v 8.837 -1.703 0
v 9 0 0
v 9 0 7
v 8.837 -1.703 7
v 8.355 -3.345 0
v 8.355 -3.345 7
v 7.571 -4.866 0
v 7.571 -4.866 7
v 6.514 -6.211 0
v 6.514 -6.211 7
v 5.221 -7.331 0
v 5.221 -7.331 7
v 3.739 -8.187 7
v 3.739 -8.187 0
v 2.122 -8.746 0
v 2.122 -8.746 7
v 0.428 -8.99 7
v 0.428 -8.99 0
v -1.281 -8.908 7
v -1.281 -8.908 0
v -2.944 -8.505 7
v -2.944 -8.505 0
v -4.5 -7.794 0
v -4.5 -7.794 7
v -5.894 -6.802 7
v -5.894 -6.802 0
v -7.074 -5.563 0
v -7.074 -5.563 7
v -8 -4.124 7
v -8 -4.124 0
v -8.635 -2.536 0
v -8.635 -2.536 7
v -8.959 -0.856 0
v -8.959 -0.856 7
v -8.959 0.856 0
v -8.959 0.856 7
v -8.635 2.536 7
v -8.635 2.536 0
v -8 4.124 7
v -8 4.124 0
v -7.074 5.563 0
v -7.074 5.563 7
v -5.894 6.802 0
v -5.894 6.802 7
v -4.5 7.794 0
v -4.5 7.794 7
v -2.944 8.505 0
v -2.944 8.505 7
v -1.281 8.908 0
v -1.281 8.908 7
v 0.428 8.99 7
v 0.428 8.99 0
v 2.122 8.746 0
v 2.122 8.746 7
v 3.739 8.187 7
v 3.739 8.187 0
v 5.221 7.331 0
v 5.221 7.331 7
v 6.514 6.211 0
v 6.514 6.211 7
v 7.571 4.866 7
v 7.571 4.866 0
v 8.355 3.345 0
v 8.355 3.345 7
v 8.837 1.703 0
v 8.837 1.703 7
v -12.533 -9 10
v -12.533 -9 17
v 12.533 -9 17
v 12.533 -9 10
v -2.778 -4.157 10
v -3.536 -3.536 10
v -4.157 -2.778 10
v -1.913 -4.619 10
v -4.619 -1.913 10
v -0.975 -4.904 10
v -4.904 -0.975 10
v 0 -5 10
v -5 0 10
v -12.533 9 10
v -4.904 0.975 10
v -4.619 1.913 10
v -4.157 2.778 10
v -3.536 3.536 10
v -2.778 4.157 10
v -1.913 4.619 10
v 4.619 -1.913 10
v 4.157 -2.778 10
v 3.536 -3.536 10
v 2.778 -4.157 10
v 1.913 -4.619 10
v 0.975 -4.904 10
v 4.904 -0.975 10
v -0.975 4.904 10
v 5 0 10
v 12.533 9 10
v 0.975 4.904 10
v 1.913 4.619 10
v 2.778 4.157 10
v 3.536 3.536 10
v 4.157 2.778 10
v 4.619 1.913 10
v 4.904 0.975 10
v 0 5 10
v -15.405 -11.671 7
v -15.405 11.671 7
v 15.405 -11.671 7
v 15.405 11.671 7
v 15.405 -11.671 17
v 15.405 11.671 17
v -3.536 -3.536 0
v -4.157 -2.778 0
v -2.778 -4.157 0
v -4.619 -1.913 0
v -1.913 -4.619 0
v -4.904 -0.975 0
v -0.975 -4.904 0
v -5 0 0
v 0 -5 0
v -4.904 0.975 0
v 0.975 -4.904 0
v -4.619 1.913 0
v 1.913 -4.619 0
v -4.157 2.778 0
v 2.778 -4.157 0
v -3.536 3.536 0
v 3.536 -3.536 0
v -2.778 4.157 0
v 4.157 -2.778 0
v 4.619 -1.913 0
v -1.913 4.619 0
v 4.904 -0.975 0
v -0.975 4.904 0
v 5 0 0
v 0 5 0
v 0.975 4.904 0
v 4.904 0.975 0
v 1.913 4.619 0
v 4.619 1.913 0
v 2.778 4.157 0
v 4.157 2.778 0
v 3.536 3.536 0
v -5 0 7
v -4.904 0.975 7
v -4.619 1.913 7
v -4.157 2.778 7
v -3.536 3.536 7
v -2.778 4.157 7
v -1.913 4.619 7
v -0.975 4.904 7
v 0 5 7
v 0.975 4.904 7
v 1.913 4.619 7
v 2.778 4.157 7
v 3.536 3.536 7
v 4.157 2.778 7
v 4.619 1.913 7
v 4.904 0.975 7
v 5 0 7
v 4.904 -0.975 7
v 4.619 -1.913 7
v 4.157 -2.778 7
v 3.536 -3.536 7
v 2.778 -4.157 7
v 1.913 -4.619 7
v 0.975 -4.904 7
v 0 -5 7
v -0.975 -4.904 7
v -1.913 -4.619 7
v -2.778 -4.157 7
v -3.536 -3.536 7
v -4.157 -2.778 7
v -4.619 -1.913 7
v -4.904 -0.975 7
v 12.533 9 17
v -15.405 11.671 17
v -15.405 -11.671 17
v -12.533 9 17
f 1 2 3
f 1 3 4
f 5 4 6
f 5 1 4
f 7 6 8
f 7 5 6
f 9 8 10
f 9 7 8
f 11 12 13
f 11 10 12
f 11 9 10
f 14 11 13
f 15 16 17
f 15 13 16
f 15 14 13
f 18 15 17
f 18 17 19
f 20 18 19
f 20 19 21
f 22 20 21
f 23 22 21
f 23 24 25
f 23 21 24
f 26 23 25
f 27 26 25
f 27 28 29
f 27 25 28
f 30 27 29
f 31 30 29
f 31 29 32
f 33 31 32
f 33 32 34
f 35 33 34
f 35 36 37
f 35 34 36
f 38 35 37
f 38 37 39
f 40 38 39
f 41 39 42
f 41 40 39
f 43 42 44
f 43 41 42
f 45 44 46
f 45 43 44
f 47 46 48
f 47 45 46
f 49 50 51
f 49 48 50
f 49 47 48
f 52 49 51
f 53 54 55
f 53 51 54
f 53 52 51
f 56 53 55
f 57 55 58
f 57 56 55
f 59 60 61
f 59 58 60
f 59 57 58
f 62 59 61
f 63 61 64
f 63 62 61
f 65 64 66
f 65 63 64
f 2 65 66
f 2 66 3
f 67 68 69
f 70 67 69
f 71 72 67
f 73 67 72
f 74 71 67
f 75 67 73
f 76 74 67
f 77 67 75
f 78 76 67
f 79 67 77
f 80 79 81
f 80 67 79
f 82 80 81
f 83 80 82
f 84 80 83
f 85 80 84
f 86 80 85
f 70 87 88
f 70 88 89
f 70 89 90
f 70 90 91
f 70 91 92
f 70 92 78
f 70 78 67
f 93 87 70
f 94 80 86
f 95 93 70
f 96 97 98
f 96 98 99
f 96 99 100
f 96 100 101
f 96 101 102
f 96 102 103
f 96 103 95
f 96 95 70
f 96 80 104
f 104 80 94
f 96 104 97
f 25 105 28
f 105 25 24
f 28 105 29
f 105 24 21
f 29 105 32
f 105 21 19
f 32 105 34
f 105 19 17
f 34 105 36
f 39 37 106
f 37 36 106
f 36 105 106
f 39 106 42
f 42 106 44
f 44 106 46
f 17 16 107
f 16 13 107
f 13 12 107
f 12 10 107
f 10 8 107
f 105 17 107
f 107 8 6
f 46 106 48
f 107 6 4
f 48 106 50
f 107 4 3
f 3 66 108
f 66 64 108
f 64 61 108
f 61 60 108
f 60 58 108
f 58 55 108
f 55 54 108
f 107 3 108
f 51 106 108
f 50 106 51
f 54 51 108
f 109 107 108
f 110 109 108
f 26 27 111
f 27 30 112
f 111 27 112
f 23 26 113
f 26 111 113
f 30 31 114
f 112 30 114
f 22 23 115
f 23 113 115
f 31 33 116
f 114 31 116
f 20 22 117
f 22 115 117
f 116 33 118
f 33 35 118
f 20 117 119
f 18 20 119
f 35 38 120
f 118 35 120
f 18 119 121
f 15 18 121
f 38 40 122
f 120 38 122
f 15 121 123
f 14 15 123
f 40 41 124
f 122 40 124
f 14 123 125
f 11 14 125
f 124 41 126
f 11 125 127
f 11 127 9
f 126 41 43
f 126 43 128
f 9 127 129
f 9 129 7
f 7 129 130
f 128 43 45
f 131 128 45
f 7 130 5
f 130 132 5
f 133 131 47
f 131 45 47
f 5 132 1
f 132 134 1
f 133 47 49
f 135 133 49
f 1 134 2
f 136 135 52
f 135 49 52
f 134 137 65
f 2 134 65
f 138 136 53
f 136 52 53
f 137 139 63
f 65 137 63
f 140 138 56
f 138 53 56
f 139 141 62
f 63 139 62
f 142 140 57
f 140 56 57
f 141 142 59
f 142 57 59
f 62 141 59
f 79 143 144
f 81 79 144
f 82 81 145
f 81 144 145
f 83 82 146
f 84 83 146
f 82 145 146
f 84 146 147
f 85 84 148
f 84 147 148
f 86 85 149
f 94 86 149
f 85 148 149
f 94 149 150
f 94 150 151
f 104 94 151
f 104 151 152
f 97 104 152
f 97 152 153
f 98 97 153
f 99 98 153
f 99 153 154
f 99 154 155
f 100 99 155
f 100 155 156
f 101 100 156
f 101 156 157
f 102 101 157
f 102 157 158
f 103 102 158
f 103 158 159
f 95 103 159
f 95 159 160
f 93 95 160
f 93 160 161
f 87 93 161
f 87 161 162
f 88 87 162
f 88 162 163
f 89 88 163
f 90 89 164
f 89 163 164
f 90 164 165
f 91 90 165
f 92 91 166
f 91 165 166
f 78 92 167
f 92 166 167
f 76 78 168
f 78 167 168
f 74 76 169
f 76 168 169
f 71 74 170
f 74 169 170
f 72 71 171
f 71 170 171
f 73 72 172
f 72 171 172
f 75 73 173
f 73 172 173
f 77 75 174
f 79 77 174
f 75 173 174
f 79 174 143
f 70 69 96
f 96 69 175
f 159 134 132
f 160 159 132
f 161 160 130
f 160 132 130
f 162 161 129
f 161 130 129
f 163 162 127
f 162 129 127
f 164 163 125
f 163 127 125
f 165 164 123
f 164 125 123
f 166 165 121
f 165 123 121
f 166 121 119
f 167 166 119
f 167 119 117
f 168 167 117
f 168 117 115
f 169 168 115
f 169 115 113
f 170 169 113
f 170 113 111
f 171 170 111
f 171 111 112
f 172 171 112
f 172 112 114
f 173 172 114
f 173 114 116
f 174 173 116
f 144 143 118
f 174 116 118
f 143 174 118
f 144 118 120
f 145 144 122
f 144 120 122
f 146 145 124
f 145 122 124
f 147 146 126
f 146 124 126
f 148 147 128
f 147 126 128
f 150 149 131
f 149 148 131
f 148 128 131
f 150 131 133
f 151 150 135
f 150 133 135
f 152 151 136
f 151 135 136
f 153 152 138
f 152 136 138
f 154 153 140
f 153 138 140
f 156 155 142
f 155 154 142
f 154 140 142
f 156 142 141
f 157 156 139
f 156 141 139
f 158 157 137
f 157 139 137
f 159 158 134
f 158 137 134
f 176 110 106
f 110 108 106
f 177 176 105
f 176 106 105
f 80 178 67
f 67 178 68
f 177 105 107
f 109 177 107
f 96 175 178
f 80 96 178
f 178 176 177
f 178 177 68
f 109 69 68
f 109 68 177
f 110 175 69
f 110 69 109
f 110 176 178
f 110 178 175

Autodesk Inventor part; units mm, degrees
ref_plane "YZ Plane" through (0, 0, 0) normal (1, 0, 0) x (0, 1, 0)
ref_plane "XZ Plane" through (0, 0, 0) normal (0, 1, 0) x (-1, 0, 0)
ref_plane "XY Plane" through (0, 0, 0) normal (0, 0, 1) x (1, 0, 0)
sketch "Sketch1" plane through (0, 0, 0) normal (0, 0, 1) x (1, 0, 0)
  circle A0 centre (0, 0) radius 5
  circle A1 centre (0, 0) radius 9
  dimension "d0" = 10
  dimension "d1" = 18
extrude "Extrusion1" add sketch "Sketch1" along normal blind 7
thread "Thread1" size "M10x1.5" class "6H" standard "ANSI Metric M Profile" full length
sketch "Sketch13" plane through (0, 0, 7) normal (0, 0, 1) x (1, 0, 0)
  line L0 (-15.4051, -11.6713) -> (15.4051, -11.6713)
  line L1 (15.4051, -11.6713) -> (15.4051, 11.6713)
  line L2 (15.4051, 11.6713) -> (-15.4051, 11.6713)
  line L3 (-15.4051, 11.6713) -> (-15.4051, -11.6713)
  line L4 (-15.4051, -11.6713) -> (15.4051, 11.6713) construction
  line L5 (15.4051, -11.6713) -> (-15.4051, 11.6713) construction
  point P0 (0, 0)
  dimension "d50" = 30.8102
  dimension "d51" = 23.3426
extrude "Extrusion13" add sketch "Sketch13" along normal blind 10
sketch "Sketch14" plane through (0, 0, 17) normal (0, 0, 1) x (1, 0, 0)
  line L0 (-12.5334, -9) -> (12.5334, -9)
  line L1 (12.5334, -9) -> (12.5334, 9)
  line L2 (12.5334, 9) -> (-12.5334, 9)
  line L3 (-12.5334, 9) -> (-12.5334, -9)
  line L4 (-12.5334, -9) -> (12.5334, 9) construction
  line L5 (12.5334, -9) -> (-12.5334, 9) construction
  point P0 (0, 0)
extrude "Extrusion14" cut sketch "Sketch14" against normal blind 7
sketch "Sketch15" plane through (0, 0, 7) normal (0, 0, -1) x (-1, 0, 0)
  circle A0 centre (0, 0) radius 5
extrude "Extrusion15" cut sketch "Sketch15" against normal blind 7
properties part number "Newairtempguy"
